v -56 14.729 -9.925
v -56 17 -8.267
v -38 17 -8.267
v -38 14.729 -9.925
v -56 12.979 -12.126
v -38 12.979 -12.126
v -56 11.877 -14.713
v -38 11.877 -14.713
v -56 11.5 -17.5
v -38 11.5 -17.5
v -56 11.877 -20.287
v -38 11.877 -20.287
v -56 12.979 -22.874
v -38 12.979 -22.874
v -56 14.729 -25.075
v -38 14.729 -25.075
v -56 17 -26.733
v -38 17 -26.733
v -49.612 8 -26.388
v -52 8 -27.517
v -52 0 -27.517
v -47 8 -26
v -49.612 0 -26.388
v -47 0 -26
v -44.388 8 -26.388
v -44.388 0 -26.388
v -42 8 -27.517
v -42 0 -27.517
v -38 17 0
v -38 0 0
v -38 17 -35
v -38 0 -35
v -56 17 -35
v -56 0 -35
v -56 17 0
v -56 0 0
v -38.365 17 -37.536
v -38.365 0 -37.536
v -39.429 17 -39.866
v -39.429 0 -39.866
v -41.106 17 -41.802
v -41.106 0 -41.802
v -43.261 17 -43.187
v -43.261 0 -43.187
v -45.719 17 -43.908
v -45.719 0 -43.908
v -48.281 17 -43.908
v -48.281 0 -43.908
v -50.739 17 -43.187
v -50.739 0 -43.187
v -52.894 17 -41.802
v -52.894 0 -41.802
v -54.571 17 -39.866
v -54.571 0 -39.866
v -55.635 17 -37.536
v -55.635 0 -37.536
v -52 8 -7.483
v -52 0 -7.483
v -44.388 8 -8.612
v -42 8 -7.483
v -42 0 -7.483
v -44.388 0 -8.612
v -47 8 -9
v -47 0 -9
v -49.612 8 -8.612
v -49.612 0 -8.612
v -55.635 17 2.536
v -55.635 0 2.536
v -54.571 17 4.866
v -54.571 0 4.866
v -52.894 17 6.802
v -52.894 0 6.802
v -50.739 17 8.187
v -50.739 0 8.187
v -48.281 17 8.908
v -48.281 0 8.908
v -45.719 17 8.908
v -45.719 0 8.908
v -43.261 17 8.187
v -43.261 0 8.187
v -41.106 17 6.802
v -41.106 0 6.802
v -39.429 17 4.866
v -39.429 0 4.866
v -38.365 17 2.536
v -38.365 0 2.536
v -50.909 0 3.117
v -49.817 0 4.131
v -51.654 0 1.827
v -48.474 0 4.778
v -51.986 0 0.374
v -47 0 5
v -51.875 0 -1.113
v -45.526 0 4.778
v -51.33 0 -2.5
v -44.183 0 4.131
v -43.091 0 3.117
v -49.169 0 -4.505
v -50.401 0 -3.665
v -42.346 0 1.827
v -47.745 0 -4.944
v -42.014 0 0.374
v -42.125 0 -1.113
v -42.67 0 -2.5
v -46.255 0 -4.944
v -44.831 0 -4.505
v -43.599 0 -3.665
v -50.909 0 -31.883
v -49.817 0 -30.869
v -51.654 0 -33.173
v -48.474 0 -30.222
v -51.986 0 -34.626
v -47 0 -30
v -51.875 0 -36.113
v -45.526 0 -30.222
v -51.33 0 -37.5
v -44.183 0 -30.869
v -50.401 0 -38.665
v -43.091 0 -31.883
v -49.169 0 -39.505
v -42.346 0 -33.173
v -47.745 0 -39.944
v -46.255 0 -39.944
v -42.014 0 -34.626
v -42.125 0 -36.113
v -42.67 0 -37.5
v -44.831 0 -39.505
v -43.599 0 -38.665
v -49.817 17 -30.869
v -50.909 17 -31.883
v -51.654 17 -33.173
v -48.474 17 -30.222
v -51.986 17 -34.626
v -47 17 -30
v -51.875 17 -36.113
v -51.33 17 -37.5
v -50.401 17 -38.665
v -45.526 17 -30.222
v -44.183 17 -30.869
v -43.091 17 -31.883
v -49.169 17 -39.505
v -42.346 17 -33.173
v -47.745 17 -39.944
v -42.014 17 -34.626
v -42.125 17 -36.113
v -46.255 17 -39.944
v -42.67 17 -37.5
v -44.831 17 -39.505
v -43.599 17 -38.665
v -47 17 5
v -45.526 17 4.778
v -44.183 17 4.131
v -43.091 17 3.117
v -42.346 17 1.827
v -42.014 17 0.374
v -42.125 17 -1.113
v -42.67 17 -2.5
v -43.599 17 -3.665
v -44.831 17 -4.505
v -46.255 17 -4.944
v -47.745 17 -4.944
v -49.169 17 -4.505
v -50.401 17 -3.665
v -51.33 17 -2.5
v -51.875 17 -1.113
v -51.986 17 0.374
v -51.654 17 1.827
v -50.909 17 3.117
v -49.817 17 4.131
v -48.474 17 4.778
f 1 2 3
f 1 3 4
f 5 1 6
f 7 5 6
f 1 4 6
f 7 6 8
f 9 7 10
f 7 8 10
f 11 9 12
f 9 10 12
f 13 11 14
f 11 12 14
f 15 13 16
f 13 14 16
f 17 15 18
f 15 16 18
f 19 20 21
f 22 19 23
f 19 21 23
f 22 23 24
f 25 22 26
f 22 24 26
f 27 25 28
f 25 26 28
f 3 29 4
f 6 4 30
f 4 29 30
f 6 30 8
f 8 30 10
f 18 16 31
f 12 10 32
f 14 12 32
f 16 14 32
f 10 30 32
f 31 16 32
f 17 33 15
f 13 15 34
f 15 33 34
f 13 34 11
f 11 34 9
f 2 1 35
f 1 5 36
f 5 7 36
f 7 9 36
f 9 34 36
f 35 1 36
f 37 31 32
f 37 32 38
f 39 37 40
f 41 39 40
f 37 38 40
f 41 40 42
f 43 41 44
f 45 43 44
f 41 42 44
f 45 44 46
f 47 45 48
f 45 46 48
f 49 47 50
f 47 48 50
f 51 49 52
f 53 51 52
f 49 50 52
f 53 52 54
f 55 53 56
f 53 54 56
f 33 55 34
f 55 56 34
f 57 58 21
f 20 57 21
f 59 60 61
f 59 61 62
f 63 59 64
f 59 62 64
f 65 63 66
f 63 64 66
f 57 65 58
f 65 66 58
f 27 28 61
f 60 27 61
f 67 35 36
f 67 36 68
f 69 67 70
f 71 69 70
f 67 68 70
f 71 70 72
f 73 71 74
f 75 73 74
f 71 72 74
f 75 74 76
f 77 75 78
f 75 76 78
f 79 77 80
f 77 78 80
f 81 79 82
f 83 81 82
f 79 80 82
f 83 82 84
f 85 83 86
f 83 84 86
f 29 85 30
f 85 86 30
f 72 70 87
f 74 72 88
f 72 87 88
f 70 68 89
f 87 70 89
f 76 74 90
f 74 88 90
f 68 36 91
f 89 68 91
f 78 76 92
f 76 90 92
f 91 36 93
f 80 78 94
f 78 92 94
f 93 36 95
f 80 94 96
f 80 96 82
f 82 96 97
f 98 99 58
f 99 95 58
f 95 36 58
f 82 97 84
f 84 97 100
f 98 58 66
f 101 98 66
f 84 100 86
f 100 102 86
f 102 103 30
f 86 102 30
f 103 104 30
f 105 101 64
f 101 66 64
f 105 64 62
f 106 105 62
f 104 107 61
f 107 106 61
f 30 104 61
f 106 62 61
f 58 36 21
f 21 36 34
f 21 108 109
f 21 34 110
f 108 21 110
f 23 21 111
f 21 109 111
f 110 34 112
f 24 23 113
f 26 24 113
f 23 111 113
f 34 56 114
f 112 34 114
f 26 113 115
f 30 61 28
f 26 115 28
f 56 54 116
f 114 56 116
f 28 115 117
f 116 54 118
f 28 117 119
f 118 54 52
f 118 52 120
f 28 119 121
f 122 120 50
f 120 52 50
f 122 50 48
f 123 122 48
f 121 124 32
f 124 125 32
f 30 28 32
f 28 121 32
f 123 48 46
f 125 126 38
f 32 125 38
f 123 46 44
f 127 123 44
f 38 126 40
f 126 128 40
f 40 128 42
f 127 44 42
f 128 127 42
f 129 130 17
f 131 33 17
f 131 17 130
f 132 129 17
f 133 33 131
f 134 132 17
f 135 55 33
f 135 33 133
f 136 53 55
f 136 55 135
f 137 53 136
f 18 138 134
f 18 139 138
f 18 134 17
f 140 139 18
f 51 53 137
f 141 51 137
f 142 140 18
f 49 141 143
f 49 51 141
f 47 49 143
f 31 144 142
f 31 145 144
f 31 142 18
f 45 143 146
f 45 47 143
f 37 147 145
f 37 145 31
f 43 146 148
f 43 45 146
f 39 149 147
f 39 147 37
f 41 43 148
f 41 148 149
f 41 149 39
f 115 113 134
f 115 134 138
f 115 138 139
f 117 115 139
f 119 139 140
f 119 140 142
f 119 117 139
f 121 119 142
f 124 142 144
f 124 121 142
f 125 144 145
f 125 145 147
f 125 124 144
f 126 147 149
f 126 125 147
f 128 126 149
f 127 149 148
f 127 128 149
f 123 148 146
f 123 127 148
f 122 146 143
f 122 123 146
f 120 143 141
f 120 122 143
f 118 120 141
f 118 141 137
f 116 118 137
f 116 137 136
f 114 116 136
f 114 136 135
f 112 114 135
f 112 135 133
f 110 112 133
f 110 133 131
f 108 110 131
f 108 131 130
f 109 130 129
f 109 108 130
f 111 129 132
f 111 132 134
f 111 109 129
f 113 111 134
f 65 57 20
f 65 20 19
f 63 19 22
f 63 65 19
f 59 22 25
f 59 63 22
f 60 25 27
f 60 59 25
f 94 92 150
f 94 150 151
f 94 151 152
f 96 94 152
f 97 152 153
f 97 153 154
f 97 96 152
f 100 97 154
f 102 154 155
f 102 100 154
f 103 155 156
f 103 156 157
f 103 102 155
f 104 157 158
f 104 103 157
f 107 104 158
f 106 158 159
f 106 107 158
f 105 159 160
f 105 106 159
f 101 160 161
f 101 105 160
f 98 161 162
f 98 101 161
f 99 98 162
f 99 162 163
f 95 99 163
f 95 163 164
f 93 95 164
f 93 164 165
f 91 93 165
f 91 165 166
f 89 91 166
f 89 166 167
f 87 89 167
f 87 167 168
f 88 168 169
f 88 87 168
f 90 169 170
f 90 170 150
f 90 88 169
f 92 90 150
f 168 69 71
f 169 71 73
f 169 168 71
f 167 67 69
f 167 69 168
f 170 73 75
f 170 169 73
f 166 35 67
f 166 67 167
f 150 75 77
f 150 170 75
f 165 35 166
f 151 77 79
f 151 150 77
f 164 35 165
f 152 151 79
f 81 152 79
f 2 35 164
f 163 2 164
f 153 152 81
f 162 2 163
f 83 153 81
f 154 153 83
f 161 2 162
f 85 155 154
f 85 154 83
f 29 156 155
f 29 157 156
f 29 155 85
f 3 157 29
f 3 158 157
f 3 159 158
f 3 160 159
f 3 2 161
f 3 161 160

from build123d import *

# Parameters (mm, degrees)
SKETCH1_R           = 5
BOSS_EXTRUDE1_DEPTH = 17
SKETCH2_R           = 10.5
CUT_EXTRUDE1_DEPTH  = 64
CUT_EXTRUDE2_DEPTH  = 8


with BuildPart() as part:
    # Sketch1 → Boss-Extrude1 (new body)
    with BuildSketch(Plane(origin=(0, 0, 0), x_dir=(1, 0, 0), z_dir=(0, 1, 0))):
        with BuildLine():
            Line((-38, 0), (-38, 35))
            ThreePointArc((-38, 35), (-47, 44), (-56, 35))
            Line((-56, 35), (-56, 0))
            ThreePointArc((-56, 0), (-47, -9), (-38, 0))
        make_face()
        with Locations(Location((-47, 35, 0), (0, 0, 270))):
            Circle(SKETCH1_R, mode=Mode.SUBTRACT)
        with Locations(Location((-47, 0, 0), (0, 0, 270))):
            Circle(SKETCH1_R, mode=Mode.SUBTRACT)
    extrude(amount=BOSS_EXTRUDE1_DEPTH)

    # Sketch2 → Cut-Extrude1 (cut)
    with BuildSketch(Plane(origin=(0, 0, 0), x_dir=(0, 0, -1), z_dir=(1, 0, 0))):
        with Locations((17.5, 22)):
            Circle(SKETCH2_R)
    extrude(amount=-CUT_EXTRUDE1_DEPTH, mode=Mode.SUBTRACT)

    # Sketch3 → Cut-Extrude2 (cut)
    with BuildSketch(Plane.XZ):
        with BuildLine():
            Line((-52, -7.483314774), (-52, -27.516685226))
            ThreePointArc((-52, -27.516685226), (-47, -26), (-42, -27.516685226))
            Line((-42, -27.516685226), (-42, -7.483314774))
            ThreePointArc((-42, -7.483314774), (-47, -9), (-52, -7.483314774))
        make_face()
    extrude(amount=-CUT_EXTRUDE2_DEPTH, mode=Mode.SUBTRACT)


solid = part.part
